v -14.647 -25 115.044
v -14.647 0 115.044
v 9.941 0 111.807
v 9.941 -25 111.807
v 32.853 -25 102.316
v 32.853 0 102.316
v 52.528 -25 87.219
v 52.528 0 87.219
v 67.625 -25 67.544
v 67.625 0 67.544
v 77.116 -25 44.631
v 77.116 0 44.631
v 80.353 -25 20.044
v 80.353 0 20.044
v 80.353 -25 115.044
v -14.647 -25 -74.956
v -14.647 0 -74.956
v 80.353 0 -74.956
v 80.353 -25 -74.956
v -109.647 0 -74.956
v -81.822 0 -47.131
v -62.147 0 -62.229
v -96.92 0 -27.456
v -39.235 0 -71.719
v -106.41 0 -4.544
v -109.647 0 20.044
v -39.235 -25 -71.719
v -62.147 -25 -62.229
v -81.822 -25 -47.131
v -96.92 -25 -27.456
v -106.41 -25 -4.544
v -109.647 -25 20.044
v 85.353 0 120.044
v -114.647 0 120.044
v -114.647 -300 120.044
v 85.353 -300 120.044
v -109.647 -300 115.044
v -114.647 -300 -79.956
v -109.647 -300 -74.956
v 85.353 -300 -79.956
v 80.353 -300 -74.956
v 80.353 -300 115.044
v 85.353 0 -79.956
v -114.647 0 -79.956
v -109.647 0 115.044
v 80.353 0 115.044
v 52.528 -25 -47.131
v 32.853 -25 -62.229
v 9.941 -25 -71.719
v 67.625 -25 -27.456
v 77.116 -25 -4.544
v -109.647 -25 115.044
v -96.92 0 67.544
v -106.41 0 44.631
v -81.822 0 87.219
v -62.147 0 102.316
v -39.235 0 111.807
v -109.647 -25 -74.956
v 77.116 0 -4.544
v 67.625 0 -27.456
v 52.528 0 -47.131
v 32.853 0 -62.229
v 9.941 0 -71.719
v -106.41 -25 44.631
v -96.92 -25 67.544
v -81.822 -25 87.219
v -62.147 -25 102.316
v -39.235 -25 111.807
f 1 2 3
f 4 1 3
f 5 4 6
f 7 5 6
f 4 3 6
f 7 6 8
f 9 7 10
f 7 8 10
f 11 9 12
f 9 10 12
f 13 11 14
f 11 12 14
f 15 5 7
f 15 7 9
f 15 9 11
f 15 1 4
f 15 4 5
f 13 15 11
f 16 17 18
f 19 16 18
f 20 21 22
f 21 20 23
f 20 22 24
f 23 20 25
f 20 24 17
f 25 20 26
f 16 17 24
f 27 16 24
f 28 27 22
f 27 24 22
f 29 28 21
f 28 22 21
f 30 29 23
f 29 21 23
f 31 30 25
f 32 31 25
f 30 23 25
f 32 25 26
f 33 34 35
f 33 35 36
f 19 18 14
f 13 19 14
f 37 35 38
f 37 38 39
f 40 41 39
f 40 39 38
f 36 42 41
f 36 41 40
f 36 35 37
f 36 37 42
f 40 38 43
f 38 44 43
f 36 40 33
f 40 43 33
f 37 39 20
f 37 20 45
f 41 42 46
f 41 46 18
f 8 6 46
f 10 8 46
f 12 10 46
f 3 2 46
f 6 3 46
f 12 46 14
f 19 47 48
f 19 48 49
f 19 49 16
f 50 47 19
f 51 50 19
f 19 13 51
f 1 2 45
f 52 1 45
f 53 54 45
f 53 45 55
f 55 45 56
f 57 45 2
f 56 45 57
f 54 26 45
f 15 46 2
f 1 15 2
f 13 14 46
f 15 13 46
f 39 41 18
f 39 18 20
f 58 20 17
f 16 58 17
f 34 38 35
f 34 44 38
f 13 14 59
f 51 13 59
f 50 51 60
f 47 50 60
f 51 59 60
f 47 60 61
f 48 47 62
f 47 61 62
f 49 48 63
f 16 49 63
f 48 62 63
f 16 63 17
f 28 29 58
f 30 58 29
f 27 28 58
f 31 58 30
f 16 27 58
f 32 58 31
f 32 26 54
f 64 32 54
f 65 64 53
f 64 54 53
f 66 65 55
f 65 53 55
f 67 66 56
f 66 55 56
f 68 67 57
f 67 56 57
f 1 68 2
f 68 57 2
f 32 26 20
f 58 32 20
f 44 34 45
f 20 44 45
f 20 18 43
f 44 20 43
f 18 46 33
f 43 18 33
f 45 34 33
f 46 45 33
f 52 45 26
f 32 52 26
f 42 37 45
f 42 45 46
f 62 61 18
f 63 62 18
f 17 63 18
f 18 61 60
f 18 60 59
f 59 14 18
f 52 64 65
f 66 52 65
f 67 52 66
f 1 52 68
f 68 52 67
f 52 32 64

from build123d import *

# Parameters (mm, degrees)
F1_DEPTH = 25
F0_W     = 200
F0_H     = 200
F2_DEPTH = 25
F3_DEPTH = 275


with BuildPart() as f1:
    # F0 (on Front) → F1 (new body)
    with BuildSketch(Plane.XZ):
        with BuildLine():
            Line((80.3527337313, 115.043669641), (-14.6472653884, 115.043669641))
            ThreePointArc((-14.6472653884, 115.043669641), (52.5278782552, 87.2188135425), (80.3527337313, 20.043669641))
            Line((80.3527337313, 20.043669641), (80.3527337313, 115.043669641))
        make_face()
    extrude(amount=F1_DEPTH)


with BuildPart() as f1b:
    # F0 (on Front) → F1, piece 2 (new body)
    with BuildSketch(Plane.XZ):
        with BuildLine():
            Line((-14.6472653884, 115.043669641), (-109.6472662687, 115.043669641))
            Line((-109.6472662687, 115.043669641), (-109.6472662687, 20.0436696216))
            ThreePointArc((-109.6472662687, 20.0436696216), (-81.8224101771, 87.2188141581), (-14.6472653884, 115.043669641))
        make_face()
    extrude(amount=F1_DEPTH)


with BuildPart() as f1c:
    # F0 (on Front) → F1, piece 3 (new body)
    with BuildSketch(Plane.XZ):
        with BuildLine():
            ThreePointArc((-14.6472666457, -74.956330359), (-81.8224106079, -47.1314744453), (-109.6472662687, 20.0436696216))
            Line((-109.6472662687, 20.0436696216), (-109.6472662687, -74.956330359))
            Line((-109.6472662687, -74.956330359), (-14.6472666457, -74.956330359))
        make_face()
    extrude(amount=F1_DEPTH)


with BuildPart() as f1d:
    # F0 (on Front) → F1, piece 4 (new body)
    with BuildSketch(Plane.XZ):
        with BuildLine():
            Line((80.3527337313, -74.956330359), (80.3527337313, 20.043669641))
            ThreePointArc((80.3527337313, 20.043669641), (52.5278778107, -47.131474705), (-14.6472666457, -74.956330359))
            Line((-14.6472666457, -74.956330359), (80.3527337313, -74.956330359))
        make_face()
    extrude(amount=F1_DEPTH)


with BuildPart() as f2:
    # F0 (on Front) → F2 (new body)
    with BuildSketch(Plane.XZ):
        with Locations((-14.6472662687, 20.043669641)):
            Rectangle(F0_W, F0_H)
        Polygon((-109.6472662687, 20.0436696216), (-109.6472662687, 115.043669641), (-14.6472653884, 115.043669641), (80.3527337313, 115.043669641), (80.3527337313, 20.043669641), (80.3527337313, -74.956330359), (-14.6472666457, -74.956330359), (-109.6472662687, -74.956330359), align=None, mode=Mode.SUBTRACT)
    extrude(amount=F2_DEPTH)

    # F3 (add): a face of the model
    f3_faces = [f2.faces().sort_by_distance(p)[0] for p in [
        (-14.6472662687, -25, 117.2152425163),
    ]]
    extrude(f3_faces, amount=F3_DEPTH)


solid = Compound([f1.part, f1b.part, f1c.part, f1d.part, f2.part])
